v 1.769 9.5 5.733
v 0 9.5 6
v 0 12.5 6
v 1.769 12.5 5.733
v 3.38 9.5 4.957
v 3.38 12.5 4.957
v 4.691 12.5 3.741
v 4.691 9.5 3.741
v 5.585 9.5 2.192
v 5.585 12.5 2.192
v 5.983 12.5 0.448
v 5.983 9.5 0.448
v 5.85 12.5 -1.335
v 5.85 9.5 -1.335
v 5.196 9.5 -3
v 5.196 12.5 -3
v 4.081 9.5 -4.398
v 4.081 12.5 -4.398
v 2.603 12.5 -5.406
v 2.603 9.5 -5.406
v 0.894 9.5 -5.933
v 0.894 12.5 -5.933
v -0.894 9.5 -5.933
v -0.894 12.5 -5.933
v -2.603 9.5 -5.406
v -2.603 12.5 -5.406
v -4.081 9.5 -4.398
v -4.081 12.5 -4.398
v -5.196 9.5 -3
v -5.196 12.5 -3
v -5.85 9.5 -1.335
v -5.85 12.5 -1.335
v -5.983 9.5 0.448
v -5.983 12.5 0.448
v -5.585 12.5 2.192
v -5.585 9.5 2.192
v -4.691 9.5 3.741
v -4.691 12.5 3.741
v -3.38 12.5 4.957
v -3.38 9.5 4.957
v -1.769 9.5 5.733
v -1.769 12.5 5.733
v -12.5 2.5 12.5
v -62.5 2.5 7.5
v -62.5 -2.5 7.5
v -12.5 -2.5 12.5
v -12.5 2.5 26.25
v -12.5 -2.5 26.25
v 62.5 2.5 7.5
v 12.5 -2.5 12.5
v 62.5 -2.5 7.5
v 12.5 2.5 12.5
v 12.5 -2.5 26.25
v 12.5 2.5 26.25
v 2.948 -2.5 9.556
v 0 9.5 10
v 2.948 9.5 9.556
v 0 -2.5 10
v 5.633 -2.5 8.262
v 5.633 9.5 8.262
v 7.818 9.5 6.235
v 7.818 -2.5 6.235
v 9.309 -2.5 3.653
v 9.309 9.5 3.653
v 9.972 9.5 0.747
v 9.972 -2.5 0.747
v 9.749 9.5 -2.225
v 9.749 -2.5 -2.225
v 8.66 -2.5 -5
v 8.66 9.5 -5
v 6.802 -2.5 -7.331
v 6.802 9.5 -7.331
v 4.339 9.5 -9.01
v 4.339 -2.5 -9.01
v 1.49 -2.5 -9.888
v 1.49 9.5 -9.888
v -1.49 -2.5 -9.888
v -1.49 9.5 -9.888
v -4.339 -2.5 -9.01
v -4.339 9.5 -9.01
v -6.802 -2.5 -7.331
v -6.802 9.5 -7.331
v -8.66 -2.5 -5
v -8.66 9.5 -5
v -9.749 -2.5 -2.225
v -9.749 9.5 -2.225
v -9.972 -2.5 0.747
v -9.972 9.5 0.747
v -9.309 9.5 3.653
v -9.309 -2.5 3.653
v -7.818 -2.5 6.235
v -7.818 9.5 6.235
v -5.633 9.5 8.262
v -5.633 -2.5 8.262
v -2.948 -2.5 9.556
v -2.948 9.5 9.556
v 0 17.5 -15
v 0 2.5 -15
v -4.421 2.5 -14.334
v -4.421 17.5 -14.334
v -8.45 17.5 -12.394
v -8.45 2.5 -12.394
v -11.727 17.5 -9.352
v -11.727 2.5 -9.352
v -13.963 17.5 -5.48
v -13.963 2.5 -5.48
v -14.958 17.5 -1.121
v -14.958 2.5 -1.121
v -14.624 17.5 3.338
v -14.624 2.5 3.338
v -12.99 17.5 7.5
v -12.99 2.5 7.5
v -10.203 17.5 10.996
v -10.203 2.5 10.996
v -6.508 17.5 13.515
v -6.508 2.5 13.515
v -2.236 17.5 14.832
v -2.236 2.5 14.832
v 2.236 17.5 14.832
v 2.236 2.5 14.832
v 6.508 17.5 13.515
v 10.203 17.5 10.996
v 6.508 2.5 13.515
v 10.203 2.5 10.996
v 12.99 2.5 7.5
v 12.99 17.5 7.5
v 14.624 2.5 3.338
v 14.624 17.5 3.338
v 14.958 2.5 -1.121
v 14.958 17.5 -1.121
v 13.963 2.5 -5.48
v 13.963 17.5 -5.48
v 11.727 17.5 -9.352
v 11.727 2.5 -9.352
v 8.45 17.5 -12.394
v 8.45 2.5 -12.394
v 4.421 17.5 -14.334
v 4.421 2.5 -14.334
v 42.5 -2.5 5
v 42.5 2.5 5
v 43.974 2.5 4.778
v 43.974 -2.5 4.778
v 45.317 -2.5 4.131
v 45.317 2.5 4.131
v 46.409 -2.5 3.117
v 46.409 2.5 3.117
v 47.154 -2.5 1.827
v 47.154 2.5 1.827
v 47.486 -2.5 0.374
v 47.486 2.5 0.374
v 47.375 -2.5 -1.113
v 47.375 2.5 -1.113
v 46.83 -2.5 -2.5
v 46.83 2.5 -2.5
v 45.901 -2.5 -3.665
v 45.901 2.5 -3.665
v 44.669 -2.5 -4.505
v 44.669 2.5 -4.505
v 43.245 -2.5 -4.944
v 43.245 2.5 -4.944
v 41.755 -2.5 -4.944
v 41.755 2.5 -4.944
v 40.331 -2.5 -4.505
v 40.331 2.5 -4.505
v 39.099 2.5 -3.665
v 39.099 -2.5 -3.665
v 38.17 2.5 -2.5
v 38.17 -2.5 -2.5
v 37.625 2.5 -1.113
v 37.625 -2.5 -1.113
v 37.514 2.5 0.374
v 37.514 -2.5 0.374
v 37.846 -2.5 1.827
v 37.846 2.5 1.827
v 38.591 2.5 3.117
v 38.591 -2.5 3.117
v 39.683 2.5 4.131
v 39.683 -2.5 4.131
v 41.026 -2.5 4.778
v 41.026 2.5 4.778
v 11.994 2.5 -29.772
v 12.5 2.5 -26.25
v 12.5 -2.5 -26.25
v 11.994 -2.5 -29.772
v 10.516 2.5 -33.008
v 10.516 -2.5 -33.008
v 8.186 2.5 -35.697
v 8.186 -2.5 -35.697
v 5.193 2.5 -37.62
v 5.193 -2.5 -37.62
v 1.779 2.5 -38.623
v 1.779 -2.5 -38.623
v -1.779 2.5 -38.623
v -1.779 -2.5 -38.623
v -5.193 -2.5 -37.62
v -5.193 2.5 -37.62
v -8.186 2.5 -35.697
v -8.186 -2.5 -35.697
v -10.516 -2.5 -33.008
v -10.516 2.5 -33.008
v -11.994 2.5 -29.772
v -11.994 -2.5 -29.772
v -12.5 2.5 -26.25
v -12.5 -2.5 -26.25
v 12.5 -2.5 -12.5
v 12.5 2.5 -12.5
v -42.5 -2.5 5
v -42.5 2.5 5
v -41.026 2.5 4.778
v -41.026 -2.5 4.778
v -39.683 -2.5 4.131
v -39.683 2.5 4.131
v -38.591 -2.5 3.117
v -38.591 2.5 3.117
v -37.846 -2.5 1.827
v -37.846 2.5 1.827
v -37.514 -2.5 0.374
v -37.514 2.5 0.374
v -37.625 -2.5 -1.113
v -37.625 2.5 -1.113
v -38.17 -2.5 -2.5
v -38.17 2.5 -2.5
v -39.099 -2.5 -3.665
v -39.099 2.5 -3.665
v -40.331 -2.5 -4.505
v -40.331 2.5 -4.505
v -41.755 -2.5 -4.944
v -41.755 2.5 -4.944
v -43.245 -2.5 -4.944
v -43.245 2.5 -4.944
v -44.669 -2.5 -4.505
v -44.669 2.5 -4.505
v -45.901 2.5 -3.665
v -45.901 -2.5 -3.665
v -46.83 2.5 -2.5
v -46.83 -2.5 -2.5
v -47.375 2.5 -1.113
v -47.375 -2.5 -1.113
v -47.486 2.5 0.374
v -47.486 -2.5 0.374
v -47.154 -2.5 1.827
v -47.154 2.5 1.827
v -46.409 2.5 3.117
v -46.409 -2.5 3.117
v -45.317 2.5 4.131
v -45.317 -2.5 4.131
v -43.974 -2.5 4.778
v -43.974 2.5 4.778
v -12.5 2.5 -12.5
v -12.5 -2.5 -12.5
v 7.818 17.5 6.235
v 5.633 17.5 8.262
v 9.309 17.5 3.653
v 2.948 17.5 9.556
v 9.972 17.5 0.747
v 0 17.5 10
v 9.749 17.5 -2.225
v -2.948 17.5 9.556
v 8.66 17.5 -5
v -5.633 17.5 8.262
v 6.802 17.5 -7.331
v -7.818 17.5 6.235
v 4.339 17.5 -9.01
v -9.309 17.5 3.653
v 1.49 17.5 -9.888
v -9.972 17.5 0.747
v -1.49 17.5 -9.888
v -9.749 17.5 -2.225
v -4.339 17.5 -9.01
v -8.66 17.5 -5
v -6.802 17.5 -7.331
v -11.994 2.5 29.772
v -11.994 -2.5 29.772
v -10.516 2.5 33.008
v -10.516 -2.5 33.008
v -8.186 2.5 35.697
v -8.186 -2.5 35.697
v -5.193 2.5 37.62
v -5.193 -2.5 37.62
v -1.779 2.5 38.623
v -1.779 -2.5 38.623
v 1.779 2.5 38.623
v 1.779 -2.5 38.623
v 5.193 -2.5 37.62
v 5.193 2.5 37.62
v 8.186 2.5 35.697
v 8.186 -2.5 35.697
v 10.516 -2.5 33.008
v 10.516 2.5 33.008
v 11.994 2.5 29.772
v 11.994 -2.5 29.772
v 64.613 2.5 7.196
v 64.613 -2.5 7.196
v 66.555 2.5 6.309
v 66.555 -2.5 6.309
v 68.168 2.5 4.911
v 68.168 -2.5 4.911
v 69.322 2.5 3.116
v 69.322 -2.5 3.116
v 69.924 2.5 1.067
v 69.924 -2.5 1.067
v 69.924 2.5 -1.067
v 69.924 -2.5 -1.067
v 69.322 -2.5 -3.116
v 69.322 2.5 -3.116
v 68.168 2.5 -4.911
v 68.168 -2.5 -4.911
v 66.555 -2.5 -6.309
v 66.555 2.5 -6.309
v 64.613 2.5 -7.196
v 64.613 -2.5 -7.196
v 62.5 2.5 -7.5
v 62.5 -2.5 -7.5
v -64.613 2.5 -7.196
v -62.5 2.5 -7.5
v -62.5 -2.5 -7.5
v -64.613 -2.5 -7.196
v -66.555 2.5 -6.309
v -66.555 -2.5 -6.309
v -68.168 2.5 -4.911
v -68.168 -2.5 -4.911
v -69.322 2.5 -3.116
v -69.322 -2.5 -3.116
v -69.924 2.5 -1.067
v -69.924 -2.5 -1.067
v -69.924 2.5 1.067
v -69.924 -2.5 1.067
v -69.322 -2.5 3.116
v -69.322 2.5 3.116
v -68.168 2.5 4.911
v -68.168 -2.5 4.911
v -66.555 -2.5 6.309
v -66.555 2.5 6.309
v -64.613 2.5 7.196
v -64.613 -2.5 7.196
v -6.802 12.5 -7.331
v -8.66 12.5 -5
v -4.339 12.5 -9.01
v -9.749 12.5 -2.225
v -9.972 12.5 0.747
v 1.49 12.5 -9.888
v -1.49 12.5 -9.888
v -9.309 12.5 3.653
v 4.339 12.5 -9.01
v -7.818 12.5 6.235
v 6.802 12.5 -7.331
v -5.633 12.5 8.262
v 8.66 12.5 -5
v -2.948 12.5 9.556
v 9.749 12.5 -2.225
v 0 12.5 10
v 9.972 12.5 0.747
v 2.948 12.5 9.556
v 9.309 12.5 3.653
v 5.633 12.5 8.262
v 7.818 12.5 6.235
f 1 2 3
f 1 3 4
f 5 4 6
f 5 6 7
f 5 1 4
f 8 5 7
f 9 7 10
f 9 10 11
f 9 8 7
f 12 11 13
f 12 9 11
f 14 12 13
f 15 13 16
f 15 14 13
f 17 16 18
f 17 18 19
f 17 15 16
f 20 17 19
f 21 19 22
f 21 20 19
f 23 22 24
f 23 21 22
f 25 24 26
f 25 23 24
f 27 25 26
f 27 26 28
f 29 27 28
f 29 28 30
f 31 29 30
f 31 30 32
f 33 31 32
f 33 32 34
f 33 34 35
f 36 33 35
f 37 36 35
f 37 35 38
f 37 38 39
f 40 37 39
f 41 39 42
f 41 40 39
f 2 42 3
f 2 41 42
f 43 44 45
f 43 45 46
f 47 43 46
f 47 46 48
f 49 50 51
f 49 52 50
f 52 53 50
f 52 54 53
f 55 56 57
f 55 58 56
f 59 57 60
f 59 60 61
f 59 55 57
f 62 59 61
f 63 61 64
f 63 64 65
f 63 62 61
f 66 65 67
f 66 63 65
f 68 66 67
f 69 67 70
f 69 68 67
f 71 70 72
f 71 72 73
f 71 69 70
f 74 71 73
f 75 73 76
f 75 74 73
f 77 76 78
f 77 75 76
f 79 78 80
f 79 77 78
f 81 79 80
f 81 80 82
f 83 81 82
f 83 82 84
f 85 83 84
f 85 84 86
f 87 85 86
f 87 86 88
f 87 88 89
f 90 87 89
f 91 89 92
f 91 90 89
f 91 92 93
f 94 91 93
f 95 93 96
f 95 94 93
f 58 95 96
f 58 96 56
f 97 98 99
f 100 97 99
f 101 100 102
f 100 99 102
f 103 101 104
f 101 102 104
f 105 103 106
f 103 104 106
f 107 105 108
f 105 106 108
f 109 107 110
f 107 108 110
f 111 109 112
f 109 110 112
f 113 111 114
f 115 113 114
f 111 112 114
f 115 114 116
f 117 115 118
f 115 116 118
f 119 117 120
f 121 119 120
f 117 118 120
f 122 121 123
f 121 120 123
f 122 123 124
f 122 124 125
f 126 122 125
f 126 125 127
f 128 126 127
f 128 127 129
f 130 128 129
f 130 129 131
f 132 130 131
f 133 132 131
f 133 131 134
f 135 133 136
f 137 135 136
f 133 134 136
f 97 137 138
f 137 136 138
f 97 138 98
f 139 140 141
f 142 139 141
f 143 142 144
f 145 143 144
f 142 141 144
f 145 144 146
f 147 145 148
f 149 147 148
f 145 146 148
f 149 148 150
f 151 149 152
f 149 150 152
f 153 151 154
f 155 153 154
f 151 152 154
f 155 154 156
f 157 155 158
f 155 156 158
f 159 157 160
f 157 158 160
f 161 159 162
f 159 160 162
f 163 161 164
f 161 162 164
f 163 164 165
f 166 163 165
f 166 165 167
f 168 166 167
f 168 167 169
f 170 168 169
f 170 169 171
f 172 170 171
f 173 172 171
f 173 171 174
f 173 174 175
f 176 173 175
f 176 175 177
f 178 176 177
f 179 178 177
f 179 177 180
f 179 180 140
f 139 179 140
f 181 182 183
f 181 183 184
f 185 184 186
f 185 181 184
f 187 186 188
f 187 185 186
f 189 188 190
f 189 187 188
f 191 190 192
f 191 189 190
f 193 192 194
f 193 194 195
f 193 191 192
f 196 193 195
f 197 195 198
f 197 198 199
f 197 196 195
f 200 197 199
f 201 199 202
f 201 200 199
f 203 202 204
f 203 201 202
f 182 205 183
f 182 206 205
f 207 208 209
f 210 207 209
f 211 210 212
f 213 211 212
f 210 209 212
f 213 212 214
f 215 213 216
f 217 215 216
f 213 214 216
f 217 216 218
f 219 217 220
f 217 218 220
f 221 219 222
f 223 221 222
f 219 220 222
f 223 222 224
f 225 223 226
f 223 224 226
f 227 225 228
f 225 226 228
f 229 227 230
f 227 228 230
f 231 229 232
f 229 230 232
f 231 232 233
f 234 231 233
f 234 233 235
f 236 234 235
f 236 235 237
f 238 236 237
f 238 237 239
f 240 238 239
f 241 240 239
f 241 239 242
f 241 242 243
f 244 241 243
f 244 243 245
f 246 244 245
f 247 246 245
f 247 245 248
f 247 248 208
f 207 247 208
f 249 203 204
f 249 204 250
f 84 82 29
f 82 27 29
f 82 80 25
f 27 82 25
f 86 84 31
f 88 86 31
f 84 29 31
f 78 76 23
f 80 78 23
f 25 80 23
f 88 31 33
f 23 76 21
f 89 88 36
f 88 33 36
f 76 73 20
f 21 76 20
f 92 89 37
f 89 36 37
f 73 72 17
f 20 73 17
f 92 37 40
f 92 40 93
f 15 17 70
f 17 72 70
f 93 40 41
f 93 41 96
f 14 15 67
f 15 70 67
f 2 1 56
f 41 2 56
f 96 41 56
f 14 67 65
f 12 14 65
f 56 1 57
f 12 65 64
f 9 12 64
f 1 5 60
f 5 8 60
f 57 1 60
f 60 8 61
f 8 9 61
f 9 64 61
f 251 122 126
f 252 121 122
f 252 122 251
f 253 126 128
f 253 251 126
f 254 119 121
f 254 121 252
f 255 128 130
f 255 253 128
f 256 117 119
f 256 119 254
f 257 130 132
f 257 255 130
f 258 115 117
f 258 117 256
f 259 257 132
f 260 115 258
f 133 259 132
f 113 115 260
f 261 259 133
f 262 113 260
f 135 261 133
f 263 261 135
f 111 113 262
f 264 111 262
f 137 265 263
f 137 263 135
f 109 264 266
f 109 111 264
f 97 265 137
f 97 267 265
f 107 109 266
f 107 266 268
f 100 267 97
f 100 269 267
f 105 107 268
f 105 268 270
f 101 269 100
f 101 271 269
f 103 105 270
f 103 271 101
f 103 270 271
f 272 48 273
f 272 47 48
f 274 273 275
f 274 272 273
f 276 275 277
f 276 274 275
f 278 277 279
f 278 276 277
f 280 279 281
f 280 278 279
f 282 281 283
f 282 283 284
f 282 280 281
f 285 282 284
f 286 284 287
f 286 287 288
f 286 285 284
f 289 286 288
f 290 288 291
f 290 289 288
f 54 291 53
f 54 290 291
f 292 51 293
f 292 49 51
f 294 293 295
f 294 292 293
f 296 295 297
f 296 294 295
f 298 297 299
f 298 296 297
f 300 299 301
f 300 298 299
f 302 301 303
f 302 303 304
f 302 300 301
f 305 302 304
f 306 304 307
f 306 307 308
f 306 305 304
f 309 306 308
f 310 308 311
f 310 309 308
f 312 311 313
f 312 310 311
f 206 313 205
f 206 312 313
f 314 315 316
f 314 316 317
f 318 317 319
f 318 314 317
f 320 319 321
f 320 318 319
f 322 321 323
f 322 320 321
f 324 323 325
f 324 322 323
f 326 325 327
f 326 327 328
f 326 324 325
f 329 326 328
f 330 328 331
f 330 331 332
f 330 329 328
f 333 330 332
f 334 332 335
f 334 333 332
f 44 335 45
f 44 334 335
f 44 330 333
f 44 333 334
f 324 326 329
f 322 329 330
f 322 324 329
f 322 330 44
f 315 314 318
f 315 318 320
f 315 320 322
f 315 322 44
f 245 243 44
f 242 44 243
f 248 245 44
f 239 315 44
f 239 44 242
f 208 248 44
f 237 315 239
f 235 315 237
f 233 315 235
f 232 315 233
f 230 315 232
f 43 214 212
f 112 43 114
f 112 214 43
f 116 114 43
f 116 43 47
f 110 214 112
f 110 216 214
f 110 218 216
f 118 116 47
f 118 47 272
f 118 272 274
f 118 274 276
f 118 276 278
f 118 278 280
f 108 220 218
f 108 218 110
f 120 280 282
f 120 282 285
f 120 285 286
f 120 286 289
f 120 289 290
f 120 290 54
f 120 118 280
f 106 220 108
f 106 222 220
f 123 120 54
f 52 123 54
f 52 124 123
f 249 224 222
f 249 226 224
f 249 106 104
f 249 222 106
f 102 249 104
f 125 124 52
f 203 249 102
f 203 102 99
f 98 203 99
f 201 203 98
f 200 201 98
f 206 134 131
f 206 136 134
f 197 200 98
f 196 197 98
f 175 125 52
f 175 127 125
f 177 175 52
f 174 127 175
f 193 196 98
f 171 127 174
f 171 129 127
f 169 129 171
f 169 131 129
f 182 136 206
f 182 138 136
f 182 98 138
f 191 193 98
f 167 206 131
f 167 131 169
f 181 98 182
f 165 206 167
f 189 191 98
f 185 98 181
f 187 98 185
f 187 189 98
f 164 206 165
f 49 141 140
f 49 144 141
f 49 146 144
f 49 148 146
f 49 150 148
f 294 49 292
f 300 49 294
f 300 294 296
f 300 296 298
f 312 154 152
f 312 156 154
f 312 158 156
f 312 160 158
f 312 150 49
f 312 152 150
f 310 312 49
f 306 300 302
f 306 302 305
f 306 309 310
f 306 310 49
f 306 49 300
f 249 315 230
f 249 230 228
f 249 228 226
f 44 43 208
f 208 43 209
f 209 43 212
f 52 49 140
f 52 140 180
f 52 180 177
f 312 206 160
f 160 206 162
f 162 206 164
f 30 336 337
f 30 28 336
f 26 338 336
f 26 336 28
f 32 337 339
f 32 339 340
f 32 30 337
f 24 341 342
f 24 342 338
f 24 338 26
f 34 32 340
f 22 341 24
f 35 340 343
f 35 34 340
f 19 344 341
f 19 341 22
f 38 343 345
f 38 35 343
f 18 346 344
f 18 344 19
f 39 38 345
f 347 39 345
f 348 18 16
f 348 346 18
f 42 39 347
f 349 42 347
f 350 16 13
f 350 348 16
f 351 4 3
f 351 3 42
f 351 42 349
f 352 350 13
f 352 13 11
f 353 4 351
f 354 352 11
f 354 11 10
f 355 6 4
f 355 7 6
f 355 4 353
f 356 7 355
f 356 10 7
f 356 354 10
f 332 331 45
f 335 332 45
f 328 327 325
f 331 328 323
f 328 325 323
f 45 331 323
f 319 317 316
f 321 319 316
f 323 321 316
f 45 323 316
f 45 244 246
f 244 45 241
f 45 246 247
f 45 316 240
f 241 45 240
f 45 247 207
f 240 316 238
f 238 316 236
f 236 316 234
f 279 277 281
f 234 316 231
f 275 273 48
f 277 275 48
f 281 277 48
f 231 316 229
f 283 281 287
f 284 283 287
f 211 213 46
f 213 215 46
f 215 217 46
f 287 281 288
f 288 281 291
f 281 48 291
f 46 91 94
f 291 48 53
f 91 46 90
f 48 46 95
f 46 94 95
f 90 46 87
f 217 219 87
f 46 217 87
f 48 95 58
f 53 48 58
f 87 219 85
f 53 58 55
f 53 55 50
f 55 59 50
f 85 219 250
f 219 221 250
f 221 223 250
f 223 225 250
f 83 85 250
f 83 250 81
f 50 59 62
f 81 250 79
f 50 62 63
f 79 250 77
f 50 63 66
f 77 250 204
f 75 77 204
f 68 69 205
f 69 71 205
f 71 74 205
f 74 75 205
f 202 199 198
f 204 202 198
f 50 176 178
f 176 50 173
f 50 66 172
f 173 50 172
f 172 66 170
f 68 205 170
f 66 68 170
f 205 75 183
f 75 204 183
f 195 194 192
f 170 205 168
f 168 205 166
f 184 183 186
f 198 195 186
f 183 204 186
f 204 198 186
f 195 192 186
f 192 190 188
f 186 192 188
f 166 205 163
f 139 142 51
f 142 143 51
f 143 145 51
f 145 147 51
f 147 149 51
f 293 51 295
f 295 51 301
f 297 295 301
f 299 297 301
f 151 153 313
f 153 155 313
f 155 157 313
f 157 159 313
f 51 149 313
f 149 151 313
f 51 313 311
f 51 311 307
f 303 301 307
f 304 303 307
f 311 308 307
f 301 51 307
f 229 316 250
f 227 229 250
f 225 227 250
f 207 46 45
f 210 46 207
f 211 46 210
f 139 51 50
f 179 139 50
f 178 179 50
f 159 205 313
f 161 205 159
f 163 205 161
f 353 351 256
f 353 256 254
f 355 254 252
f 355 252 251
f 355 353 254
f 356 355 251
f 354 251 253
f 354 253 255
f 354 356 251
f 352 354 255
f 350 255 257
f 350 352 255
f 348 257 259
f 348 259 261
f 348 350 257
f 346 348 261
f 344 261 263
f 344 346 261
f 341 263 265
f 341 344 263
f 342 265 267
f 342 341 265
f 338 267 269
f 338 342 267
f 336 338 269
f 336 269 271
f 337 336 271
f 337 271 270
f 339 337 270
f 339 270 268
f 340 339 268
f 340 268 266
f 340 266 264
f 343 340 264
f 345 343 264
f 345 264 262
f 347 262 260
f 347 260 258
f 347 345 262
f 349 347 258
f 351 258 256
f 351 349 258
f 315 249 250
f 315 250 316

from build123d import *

# Parameters (mm, degrees)
SKETCH1_R           = 10
BOSS_EXTRUDE1_DEPTH = 2.5
SKETCH2_R           = 15
SKETCH2_R_2         = 10
BOSS_EXTRUDE2_DEPTH = 15
SKETCH3_R           = 5
CUT_EXTRUDE1_DEPTH  = 82.403700776
BOSS_EXTRUDE3_START = 9.5
SKETCH4_R           = 10
SKETCH4_R_2         = 6
BOSS_EXTRUDE3_DEPTH = 3


with BuildPart() as part:
    # Sketch1 → Boss-Extrude1 (new, symmetric)
    with BuildSketch(Plane(origin=(0, 0, 0), x_dir=(1, 0, 0), z_dir=(0, 1, 0))):
        with BuildLine():
            Line((12.5, 12.5), (12.5, 26.25))
            ThreePointArc((12.5, 26.25), (0, 38.75), (-12.5, 26.25))
            Line((-12.5, 26.25), (-12.5, 12.5))
            Line((-12.5, 12.5), (-62.5, 7.5))
            ThreePointArc((-62.5, 7.5), (-70, 0), (-62.5, -7.5))
            Line((-62.5, -7.5), (-12.5, -12.5))
            Line((-12.5, -12.5), (-12.5, -26.25))
            ThreePointArc((-12.5, -26.25), (0, -38.75), (12.5, -26.25))
            Line((12.5, -26.25), (12.5, -12.5))
            Line((12.5, -12.5), (62.5, -7.5))
            ThreePointArc((62.5, -7.5), (70, 0), (62.5, 7.5))
            Line((62.5, 7.5), (12.5, 12.5))
        make_face()
        with Locations(Location((0, 0, 0), (0, 0, 270))):
            Circle(SKETCH1_R, mode=Mode.SUBTRACT)
    extrude(amount=BOSS_EXTRUDE1_DEPTH, both=True)

    # Sketch2 → Boss-Extrude2 (add)
    with BuildSketch(Plane(origin=(0, 2.5, 0), x_dir=(1, 0, 0), z_dir=(0, 1, 0))):
        with Locations(Location((0, 0, 0), (0, 0, 90))):
            Circle(SKETCH2_R)
        with Locations(Location((0, 0, 0), (0, 0, 270))):
            Circle(SKETCH2_R_2, mode=Mode.SUBTRACT)
    extrude(amount=BOSS_EXTRUDE2_DEPTH)

    # Sketch3 → Cut-Extrude1 (cut, through all)
    with BuildSketch(Plane(origin=(0, 2.5, 0), x_dir=(1, 0, 0), z_dir=(0, 1, 0))):
        with Locations(Location((42.5, 0, 0), (0, 0, 270))):
            Circle(SKETCH3_R)
        with Locations(Location((-42.5, 0, 0), (0, 0, 270))):
            Circle(SKETCH3_R)
    extrude(amount=-CUT_EXTRUDE1_DEPTH, mode=Mode.SUBTRACT)

    # Sketch4 → Boss-Extrude3 (add)
    with BuildSketch(Plane(origin=(0, 0, 0), x_dir=(1, 0, 0), z_dir=(0, 1, 0)).offset(BOSS_EXTRUDE3_START)):
        with Locations(Location((0, 0, 0), (0, 0, 270))):
            Circle(SKETCH4_R)
        with Locations(Location((0, 0, 0), (0, 0, 270))):
            Circle(SKETCH4_R_2, mode=Mode.SUBTRACT)
    extrude(amount=BOSS_EXTRUDE3_DEPTH)


solid = part.part
